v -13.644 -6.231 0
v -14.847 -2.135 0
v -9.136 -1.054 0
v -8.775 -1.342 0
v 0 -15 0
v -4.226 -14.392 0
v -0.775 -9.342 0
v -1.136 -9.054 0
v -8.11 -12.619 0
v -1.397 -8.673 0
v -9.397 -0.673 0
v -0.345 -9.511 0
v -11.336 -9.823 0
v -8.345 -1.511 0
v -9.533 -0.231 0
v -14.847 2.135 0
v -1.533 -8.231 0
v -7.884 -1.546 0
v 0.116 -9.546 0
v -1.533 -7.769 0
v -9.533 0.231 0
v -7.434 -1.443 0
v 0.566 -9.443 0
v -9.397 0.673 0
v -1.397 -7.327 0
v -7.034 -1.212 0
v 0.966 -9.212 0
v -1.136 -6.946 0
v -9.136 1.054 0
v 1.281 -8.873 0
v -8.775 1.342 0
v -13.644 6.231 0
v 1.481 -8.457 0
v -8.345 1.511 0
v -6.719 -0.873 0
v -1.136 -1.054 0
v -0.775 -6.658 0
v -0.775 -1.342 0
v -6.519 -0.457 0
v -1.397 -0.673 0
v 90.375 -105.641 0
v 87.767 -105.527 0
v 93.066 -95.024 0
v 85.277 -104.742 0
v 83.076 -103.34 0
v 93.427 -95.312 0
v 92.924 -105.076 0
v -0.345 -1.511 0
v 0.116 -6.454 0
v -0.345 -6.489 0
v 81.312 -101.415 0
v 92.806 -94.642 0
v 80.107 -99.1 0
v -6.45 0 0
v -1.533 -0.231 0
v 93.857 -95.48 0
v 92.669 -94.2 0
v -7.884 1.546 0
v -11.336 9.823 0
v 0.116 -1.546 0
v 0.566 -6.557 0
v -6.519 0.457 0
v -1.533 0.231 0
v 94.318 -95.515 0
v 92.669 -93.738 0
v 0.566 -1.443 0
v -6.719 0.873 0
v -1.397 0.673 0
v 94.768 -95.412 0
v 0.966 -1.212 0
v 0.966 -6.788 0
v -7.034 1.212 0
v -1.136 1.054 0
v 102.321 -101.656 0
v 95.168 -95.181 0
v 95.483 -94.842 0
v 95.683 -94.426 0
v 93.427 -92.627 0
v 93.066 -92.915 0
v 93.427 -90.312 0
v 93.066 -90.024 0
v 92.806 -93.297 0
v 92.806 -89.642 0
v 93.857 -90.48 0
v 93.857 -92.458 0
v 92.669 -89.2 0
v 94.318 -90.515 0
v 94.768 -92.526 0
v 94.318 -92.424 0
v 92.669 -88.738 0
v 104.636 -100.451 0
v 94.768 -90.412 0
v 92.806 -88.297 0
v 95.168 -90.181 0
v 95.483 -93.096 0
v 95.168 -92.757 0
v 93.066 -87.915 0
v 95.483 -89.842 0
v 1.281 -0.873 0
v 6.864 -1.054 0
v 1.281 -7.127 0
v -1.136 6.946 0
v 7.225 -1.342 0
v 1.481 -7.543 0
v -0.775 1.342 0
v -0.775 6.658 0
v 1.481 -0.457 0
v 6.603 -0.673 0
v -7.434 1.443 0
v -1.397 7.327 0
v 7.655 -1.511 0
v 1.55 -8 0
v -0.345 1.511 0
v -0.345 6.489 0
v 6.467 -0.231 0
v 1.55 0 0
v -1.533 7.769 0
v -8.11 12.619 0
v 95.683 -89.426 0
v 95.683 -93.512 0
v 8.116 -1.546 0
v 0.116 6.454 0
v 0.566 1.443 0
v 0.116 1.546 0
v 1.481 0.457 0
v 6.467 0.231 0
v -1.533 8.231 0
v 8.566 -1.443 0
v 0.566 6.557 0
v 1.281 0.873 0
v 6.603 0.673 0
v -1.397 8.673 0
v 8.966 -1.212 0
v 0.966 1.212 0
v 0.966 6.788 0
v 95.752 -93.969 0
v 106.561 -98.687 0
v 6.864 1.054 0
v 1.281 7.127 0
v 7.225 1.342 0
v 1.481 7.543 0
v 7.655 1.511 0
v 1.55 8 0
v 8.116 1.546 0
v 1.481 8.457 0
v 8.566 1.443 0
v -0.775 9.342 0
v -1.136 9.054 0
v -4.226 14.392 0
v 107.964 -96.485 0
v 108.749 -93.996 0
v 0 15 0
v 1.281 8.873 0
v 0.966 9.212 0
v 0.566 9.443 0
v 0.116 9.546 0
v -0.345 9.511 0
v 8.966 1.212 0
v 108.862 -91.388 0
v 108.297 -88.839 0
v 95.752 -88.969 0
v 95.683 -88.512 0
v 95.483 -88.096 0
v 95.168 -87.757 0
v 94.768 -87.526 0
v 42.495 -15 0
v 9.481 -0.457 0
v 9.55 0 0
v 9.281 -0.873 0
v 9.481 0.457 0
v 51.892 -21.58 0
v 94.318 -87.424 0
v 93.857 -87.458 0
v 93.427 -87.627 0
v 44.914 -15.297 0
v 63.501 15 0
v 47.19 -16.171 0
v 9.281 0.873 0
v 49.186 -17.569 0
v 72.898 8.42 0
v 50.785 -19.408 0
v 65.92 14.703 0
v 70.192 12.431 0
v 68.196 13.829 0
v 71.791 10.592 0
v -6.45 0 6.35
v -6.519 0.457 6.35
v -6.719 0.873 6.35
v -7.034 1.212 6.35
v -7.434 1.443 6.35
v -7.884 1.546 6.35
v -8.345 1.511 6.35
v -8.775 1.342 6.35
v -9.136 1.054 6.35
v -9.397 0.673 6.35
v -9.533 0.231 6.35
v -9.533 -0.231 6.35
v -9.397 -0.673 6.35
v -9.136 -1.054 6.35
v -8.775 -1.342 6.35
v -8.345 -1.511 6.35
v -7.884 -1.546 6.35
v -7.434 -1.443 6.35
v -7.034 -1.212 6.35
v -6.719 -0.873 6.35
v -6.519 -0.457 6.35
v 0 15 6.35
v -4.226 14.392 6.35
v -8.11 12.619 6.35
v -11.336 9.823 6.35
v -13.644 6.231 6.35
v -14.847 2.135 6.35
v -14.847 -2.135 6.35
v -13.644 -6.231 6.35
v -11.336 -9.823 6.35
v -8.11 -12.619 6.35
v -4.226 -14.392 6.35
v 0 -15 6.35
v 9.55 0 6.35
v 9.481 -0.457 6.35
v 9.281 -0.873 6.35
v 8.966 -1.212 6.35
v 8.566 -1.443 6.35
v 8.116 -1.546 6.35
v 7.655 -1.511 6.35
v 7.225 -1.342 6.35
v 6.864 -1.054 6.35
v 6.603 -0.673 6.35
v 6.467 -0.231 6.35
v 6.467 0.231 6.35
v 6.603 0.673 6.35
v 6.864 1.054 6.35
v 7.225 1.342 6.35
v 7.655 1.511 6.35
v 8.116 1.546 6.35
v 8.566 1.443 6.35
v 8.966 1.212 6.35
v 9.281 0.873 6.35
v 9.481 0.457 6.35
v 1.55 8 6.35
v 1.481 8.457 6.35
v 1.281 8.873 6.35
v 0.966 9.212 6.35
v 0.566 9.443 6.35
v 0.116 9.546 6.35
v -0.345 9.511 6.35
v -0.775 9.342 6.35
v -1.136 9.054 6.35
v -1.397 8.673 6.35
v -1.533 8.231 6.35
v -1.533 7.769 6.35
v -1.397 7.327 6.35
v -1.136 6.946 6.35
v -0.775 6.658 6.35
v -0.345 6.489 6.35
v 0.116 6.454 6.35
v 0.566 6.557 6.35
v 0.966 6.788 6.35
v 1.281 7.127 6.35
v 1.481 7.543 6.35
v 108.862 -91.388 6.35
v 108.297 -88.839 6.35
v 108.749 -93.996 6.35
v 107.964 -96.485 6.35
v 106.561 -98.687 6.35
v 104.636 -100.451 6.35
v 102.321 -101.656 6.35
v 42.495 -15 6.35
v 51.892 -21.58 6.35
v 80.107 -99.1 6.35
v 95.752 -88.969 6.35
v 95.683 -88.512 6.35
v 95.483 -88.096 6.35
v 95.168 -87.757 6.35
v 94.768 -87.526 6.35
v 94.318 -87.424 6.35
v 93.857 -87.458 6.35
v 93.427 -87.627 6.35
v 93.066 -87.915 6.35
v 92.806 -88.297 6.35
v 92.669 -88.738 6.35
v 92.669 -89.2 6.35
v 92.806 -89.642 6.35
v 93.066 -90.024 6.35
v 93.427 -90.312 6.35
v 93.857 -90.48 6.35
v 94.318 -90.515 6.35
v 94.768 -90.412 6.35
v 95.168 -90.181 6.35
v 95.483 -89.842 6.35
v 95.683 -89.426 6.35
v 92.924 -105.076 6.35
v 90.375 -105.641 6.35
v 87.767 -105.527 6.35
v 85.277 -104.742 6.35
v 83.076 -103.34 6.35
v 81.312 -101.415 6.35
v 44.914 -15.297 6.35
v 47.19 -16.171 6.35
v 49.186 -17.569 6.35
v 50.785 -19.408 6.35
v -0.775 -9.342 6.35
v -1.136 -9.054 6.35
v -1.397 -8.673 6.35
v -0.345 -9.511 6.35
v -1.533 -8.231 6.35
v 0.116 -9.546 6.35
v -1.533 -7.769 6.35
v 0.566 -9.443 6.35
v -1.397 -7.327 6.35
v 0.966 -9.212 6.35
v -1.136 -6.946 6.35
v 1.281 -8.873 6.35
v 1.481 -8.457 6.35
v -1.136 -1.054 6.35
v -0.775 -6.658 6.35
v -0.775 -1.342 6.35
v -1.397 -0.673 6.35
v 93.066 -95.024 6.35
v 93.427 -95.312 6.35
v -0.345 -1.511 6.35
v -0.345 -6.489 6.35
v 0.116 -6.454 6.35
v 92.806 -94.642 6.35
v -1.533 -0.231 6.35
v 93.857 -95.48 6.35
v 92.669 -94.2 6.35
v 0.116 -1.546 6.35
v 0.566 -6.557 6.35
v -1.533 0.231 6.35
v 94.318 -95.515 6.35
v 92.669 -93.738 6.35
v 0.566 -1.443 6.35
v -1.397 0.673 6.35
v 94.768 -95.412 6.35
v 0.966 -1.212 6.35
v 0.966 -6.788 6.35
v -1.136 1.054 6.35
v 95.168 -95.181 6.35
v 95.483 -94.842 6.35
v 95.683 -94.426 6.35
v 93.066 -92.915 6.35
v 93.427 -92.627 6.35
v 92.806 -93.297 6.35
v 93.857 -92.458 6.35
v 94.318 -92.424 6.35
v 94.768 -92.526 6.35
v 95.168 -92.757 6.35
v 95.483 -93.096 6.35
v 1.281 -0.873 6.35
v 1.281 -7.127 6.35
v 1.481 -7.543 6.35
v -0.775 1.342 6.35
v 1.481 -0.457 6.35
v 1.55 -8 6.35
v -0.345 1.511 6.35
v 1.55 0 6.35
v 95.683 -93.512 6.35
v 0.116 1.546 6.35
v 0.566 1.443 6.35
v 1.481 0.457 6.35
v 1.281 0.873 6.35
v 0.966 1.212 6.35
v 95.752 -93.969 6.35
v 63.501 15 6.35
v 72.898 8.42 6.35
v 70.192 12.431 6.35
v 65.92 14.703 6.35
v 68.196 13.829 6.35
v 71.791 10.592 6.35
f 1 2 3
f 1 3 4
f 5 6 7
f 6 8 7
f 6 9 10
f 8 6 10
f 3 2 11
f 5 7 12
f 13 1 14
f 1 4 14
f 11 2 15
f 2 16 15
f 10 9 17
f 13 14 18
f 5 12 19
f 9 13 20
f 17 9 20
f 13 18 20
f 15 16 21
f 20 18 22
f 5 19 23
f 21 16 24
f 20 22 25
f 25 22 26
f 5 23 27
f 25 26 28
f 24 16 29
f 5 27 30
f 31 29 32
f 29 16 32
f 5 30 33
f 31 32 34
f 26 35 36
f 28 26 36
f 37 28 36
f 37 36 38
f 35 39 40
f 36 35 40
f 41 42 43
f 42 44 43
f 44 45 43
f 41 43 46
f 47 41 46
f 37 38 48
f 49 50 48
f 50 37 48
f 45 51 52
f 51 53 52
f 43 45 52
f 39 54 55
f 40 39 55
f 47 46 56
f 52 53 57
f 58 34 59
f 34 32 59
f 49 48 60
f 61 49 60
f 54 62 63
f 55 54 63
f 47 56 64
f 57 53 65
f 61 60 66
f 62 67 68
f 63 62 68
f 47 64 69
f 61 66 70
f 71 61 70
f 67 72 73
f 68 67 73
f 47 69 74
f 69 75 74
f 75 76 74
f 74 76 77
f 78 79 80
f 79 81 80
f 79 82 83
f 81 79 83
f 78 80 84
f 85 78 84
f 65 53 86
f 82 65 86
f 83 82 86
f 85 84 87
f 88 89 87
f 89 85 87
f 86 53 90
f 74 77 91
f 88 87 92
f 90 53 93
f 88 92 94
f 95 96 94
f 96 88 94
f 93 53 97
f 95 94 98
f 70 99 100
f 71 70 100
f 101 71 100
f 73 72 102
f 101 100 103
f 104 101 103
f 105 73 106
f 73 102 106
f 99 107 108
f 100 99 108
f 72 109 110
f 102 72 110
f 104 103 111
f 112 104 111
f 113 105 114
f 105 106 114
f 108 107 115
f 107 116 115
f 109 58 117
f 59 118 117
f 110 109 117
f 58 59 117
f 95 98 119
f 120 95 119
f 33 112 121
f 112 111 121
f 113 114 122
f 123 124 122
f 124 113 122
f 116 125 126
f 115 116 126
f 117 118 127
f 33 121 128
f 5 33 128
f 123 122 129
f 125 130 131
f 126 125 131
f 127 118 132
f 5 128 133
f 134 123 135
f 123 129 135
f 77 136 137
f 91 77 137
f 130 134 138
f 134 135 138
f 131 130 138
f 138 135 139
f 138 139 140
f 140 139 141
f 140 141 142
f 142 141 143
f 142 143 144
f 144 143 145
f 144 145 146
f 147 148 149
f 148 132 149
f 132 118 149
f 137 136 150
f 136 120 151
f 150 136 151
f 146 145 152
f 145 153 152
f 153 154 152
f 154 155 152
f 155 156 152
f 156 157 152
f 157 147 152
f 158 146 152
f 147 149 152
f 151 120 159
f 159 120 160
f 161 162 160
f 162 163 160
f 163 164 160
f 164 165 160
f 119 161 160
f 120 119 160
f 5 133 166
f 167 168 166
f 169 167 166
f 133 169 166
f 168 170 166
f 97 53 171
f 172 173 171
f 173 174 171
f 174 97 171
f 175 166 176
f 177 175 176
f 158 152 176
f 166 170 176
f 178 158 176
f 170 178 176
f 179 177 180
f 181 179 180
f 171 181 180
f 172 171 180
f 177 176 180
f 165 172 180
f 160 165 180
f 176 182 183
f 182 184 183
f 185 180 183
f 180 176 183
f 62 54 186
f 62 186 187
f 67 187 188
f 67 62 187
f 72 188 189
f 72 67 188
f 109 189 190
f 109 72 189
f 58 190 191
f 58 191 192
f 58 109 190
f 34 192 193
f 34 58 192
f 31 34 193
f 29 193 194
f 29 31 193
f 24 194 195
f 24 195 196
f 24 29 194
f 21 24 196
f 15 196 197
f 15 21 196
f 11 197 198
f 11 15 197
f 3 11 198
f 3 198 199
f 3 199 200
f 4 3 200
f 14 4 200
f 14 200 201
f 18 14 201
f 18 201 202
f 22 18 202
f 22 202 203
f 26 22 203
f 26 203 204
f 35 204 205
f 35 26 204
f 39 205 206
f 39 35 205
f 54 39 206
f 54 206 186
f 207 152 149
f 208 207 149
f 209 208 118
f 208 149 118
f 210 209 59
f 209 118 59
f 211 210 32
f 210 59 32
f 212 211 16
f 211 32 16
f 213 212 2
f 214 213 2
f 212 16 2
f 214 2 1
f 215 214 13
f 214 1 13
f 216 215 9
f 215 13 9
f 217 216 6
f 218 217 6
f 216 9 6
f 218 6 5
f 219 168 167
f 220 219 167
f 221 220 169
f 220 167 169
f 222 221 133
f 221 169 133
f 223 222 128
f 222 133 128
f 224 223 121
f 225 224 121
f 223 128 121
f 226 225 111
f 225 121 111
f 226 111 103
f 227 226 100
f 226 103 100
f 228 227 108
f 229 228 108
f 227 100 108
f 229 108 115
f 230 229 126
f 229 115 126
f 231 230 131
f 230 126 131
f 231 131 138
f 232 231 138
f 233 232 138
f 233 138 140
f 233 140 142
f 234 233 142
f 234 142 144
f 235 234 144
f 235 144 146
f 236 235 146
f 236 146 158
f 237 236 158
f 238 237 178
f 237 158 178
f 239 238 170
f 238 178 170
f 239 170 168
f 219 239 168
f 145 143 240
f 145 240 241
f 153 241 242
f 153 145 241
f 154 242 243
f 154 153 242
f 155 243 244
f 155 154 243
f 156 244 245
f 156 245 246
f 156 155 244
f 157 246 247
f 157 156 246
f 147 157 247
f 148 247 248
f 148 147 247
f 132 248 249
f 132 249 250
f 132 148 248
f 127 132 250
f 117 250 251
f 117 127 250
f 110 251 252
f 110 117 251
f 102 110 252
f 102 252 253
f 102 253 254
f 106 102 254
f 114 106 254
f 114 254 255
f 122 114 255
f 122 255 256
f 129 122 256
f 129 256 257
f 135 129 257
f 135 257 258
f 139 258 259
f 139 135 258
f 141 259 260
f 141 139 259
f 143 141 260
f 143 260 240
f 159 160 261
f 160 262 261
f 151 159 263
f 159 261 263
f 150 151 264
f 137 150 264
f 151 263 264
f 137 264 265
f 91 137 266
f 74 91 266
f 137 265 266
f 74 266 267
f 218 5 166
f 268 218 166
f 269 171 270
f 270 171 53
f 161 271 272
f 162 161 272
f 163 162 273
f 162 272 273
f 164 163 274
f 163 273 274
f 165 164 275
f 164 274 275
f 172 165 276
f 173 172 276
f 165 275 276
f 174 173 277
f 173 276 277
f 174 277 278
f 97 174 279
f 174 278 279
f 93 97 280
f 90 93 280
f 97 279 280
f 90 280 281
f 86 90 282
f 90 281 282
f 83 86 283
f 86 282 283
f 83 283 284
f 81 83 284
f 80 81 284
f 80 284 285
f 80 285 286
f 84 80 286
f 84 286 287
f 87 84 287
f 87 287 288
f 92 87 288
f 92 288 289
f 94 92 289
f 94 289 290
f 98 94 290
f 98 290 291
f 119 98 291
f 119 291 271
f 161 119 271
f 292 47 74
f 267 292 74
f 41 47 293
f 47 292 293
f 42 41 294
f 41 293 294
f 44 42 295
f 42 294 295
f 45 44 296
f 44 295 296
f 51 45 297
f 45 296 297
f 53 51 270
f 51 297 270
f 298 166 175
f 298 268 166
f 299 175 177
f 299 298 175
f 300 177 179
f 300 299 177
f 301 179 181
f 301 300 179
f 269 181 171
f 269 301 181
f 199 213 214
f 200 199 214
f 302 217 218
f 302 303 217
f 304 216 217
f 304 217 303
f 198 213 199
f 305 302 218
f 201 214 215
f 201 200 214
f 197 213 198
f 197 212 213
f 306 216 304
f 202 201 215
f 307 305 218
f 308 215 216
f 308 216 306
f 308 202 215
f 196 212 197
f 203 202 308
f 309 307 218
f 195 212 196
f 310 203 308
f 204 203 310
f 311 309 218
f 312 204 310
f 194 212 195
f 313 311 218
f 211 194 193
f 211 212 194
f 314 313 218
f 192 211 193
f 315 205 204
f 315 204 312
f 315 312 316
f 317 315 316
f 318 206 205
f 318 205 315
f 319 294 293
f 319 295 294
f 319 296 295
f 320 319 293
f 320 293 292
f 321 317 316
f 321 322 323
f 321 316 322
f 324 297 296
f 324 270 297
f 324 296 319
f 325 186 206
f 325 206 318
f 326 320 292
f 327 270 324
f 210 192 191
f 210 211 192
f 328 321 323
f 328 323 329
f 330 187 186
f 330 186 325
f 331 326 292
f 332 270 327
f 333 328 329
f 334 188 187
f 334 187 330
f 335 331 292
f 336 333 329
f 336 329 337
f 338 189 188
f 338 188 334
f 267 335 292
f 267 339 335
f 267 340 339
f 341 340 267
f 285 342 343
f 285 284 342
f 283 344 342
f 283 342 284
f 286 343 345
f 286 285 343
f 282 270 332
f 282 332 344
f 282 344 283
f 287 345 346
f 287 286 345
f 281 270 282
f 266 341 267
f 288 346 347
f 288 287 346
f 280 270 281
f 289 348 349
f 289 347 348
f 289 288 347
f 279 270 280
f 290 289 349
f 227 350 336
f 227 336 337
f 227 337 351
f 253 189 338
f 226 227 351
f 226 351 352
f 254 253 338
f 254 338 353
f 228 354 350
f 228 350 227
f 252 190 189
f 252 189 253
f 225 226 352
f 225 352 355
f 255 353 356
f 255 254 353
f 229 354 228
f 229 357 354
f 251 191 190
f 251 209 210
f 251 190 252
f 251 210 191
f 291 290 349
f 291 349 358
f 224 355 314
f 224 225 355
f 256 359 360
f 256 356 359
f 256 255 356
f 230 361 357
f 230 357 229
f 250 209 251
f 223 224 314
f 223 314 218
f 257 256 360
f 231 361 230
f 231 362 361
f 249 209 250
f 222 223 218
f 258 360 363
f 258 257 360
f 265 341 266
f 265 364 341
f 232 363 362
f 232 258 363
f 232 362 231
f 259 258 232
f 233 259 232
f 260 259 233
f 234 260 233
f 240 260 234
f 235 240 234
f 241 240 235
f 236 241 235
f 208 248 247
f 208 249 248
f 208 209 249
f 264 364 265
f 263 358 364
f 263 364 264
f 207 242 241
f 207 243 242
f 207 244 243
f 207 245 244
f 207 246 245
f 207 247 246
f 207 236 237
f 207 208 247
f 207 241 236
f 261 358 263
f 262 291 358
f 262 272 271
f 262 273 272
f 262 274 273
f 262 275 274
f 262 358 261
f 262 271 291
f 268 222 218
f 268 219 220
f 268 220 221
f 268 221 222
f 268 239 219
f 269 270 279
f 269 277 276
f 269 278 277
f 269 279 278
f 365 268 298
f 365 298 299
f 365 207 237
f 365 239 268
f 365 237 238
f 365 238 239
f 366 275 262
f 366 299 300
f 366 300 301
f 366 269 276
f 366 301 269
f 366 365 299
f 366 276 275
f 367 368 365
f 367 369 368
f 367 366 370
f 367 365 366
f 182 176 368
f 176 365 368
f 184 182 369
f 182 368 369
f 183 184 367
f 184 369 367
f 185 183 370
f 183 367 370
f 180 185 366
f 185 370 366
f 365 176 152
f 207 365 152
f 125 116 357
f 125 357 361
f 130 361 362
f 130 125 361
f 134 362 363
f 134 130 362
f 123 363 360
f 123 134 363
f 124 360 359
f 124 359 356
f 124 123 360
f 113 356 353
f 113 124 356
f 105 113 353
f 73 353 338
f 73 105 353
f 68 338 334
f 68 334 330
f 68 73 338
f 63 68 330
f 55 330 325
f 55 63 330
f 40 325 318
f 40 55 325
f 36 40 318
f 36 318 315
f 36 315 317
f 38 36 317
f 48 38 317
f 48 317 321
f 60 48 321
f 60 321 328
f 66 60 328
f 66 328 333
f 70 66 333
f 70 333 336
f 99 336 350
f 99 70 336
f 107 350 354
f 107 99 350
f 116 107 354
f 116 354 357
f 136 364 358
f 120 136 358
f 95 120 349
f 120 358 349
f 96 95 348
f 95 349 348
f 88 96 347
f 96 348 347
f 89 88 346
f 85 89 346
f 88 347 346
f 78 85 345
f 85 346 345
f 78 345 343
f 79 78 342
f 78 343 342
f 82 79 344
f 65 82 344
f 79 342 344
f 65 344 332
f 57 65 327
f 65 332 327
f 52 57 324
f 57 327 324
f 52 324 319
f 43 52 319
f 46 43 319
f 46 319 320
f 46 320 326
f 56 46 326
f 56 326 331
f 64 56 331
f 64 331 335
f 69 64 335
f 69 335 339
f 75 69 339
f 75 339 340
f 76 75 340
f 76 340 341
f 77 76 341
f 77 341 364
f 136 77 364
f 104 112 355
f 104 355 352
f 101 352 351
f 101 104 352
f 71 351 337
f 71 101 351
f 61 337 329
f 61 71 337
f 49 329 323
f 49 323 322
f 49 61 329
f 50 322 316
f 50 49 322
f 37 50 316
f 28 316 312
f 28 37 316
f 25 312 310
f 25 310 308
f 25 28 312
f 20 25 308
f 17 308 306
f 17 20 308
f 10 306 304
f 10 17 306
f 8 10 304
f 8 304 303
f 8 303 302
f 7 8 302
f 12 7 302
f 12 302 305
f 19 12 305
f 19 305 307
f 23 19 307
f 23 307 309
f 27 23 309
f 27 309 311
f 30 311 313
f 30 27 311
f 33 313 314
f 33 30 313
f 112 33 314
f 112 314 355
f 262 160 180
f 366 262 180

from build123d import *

# Parameters (mm, degrees)
SKETCH1_R           = 1.55
BOSS_EXTRUDE1_DEPTH = 6.35
FILLET1_R           = 10
FILLET2_R           = 10
SKETCH2_R           = 1.55
CUT_EXTRUDE1_DEPTH  = 10


with BuildPart() as part:
    # Sketch1 → Boss-Extrude1 (new body)
    with BuildSketch(Plane.XY):
        with BuildLine():
            ThreePointArc((0, 15), (-15, 0), (0, -15))
            Line((0, -15), (49.496886927, -15))
            Line((49.496886927, -15), (83.526826454, -108.496490436))
            Line((83.526826454, -108.496490436), (111.717605078, -98.235886137))
            Line((111.717605078, -98.235886137), (70.503113073, 15))
            Line((70.503113073, 15), (0, 15))
        make_face()
        with Locations((0, -8)):
            Circle(SKETCH1_R, mode=Mode.SUBTRACT)
        with Locations((-8, 0)):
            Circle(SKETCH1_R, mode=Mode.SUBTRACT)
        Circle(SKETCH1_R, mode=Mode.SUBTRACT)
        with Locations((0, 8)):
            Circle(SKETCH1_R, mode=Mode.SUBTRACT)
        with BuildLine():
            ThreePointArc((6.45, 0), (8, 1.55), (9.55, 0))
            ThreePointArc((9.55, 0), (8, -1.55), (6.45, 0))
        make_face(mode=Mode.SUBTRACT)
    extrude(amount=BOSS_EXTRUDE1_DEPTH)

    # Fillet1
    fillet1_edges = [part.edges().sort_by_distance(p)[0] for p in [
        (49.496886927, -15, 3.175),
        (70.503113073, 15, 3.175),
    ]]
    fillet(fillet1_edges, radius=FILLET1_R)

    # Fillet2
    fillet2_edges = [part.edges().sort_by_distance(p)[0] for p in [
        (111.717605078, -98.235886137, 3.175),
        (83.526826454, -108.496490436, 3.175),
    ]]
    fillet(fillet2_edges, radius=FILLET2_R)

    # Sketch2 → Cut-Extrude1 (cut)
    with BuildSketch(Plane.XY.offset(6.35)):
        with Locations((94.202014333, -93.969262079)):
            Circle(SKETCH2_R)
        with Locations((94.202014333, -88.969262079)):
            Circle(SKETCH2_R)
    extrude(amount=-CUT_EXTRUDE1_DEPTH, mode=Mode.SUBTRACT)


solid = part.part
